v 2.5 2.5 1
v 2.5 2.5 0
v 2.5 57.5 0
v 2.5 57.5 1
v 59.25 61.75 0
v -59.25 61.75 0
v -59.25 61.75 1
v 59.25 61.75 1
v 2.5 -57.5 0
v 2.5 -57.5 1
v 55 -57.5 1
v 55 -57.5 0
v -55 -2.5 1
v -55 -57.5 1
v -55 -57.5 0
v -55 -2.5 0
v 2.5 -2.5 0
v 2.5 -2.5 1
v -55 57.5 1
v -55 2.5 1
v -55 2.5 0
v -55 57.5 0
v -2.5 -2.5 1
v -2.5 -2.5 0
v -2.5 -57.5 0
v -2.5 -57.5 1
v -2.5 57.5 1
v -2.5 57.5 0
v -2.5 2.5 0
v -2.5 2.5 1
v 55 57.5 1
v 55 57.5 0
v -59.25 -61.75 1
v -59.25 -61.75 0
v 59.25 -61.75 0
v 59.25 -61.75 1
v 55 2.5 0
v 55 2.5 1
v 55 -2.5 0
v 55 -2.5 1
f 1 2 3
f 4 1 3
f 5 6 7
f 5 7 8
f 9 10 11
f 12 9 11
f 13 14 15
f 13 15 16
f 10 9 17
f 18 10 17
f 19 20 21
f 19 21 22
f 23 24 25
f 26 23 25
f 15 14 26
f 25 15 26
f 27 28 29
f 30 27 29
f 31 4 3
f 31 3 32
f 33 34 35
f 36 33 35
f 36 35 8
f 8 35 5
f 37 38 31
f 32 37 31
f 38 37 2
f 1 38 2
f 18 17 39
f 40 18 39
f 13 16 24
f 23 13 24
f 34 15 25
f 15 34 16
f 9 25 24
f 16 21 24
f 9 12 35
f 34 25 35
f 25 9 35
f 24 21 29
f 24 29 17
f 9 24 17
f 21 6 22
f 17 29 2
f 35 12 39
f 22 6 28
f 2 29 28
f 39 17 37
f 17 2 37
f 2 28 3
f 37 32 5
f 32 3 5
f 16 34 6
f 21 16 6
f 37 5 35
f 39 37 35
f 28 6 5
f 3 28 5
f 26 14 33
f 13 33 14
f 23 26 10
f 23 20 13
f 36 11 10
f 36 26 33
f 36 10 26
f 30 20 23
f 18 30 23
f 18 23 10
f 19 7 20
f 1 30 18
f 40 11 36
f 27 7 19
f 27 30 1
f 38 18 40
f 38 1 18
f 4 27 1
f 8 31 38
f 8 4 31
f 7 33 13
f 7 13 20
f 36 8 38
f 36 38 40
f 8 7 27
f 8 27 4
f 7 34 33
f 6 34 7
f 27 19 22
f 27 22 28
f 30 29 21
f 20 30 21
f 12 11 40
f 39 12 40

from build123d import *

# Parameters (mm, degrees)
F0_W     = 118.5
F0_H     = 123.5
F1_DEPTH = 1
F2_W     = 110
F2_H     = 115
F3_DEPTH = 25
F5_DEPTH = 1


with BuildPart() as f1:
    # F0 (on Top) → F1 (new body)
    with BuildSketch(Plane.XY):
        Rectangle(F0_W, F0_H)
    extrude(amount=F1_DEPTH)

    # F2 (on face) → F3 (cut)
    with BuildSketch(Plane.XY.offset(1)):
        Rectangle(F2_W, F2_H)
    extrude(amount=-F3_DEPTH, mode=Mode.SUBTRACT)

    # F4 (on Top) → F5 (join)
    with BuildSketch(Plane.XY):
        Polygon((2.5, 2.5), (2.5, 57.5), (-2.5, 57.5), (-2.5, 2.5), (-55, 2.5), (-55, -2.5), (-2.5, -2.5), (-2.5, -57.5), (2.5, -57.5), (2.5, -2.5), (55, -2.5), (55, 2.5), align=None)
    extrude(amount=F5_DEPTH)


solid = f1.part
